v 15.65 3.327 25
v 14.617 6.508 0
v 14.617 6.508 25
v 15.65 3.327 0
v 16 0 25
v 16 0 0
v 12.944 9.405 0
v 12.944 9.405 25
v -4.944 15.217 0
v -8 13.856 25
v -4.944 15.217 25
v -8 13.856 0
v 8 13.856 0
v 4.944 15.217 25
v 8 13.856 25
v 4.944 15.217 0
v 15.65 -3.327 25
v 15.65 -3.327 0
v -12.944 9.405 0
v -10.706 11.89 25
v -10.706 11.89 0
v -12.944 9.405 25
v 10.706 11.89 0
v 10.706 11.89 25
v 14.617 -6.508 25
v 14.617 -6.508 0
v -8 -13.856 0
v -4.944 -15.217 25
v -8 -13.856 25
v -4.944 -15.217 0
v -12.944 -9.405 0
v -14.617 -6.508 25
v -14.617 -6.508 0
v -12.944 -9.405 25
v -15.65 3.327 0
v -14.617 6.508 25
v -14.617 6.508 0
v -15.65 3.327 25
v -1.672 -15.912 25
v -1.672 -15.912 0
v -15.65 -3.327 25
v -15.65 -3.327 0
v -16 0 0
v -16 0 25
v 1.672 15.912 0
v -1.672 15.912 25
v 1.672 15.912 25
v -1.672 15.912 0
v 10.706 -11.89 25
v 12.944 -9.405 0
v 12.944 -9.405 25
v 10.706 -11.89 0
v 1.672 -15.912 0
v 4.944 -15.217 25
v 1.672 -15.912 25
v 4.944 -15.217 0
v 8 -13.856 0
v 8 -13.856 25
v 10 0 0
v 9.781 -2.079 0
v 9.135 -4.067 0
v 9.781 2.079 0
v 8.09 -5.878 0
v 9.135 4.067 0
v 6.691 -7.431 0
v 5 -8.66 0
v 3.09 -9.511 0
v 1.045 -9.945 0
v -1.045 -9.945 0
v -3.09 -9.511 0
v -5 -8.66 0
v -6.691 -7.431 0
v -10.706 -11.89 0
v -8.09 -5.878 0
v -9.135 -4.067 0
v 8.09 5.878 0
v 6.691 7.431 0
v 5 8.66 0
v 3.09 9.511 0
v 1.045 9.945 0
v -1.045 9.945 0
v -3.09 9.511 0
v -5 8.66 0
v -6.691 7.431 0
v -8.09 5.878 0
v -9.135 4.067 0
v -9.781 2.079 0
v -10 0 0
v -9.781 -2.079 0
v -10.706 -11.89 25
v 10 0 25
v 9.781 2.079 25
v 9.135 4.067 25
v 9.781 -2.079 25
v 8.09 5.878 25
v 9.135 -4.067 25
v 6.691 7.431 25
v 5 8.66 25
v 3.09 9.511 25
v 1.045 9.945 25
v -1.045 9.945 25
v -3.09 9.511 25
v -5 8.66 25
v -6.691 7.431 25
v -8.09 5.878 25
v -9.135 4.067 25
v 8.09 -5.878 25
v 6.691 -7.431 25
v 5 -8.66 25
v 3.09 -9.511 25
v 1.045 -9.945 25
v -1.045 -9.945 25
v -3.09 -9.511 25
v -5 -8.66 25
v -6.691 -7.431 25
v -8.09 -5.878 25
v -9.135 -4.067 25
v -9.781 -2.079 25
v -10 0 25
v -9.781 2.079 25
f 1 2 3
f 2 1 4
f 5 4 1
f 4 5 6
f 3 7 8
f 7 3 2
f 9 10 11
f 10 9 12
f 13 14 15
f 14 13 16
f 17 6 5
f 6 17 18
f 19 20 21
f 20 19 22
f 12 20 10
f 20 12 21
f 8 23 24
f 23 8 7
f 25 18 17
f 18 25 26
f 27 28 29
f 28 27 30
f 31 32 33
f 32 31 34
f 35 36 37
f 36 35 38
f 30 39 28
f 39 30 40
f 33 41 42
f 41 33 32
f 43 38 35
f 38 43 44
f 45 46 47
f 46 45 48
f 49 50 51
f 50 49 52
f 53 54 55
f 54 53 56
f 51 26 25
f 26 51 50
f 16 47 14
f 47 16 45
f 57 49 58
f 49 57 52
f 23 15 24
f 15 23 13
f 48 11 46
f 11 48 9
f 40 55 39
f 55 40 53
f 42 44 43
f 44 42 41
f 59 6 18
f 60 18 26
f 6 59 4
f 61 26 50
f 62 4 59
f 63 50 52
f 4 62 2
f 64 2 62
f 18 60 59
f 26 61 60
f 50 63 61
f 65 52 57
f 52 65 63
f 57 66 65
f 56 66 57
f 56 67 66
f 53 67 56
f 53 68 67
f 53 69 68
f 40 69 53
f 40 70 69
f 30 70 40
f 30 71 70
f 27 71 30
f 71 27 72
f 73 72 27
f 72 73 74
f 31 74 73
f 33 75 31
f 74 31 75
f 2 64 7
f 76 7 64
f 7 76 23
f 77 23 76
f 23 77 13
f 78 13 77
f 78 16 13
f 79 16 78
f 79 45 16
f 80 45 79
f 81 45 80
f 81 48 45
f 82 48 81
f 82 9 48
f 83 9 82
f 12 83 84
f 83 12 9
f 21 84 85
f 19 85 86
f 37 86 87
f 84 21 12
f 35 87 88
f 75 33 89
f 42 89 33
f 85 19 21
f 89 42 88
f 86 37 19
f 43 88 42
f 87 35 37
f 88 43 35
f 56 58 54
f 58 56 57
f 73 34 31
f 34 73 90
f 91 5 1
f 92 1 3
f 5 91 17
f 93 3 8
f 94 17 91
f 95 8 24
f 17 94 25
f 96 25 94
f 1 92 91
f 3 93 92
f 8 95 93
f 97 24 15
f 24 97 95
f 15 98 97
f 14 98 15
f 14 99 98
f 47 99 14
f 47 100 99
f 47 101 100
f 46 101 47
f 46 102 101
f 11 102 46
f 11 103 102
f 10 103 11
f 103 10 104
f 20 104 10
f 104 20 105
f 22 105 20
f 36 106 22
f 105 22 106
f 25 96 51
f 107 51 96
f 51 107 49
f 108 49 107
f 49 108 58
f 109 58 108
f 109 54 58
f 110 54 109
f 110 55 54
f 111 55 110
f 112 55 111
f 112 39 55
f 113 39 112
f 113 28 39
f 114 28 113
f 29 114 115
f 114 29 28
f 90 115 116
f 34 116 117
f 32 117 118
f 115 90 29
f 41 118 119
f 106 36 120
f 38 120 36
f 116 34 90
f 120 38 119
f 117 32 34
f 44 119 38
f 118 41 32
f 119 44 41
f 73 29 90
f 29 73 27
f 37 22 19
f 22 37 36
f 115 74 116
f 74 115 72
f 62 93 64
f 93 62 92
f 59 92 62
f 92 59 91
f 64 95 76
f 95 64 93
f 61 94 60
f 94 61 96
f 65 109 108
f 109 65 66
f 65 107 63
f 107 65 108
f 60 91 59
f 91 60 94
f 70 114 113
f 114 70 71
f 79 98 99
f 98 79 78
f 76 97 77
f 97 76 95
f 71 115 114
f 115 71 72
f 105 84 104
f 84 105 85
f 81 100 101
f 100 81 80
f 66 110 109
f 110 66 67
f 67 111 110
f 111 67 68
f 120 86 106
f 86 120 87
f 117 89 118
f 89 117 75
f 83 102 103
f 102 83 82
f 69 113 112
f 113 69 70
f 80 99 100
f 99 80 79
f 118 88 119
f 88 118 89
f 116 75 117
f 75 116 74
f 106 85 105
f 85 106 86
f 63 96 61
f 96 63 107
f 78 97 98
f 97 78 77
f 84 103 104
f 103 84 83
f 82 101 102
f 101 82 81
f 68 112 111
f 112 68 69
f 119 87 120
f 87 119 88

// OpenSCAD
module tube(od=16, id=10, length=25) {
difference(){
        cylinder(h=length, r=od);
        translate([0,0,-0.005])cylinder(h=length+0.01, r=id);
    };
}

tube();
